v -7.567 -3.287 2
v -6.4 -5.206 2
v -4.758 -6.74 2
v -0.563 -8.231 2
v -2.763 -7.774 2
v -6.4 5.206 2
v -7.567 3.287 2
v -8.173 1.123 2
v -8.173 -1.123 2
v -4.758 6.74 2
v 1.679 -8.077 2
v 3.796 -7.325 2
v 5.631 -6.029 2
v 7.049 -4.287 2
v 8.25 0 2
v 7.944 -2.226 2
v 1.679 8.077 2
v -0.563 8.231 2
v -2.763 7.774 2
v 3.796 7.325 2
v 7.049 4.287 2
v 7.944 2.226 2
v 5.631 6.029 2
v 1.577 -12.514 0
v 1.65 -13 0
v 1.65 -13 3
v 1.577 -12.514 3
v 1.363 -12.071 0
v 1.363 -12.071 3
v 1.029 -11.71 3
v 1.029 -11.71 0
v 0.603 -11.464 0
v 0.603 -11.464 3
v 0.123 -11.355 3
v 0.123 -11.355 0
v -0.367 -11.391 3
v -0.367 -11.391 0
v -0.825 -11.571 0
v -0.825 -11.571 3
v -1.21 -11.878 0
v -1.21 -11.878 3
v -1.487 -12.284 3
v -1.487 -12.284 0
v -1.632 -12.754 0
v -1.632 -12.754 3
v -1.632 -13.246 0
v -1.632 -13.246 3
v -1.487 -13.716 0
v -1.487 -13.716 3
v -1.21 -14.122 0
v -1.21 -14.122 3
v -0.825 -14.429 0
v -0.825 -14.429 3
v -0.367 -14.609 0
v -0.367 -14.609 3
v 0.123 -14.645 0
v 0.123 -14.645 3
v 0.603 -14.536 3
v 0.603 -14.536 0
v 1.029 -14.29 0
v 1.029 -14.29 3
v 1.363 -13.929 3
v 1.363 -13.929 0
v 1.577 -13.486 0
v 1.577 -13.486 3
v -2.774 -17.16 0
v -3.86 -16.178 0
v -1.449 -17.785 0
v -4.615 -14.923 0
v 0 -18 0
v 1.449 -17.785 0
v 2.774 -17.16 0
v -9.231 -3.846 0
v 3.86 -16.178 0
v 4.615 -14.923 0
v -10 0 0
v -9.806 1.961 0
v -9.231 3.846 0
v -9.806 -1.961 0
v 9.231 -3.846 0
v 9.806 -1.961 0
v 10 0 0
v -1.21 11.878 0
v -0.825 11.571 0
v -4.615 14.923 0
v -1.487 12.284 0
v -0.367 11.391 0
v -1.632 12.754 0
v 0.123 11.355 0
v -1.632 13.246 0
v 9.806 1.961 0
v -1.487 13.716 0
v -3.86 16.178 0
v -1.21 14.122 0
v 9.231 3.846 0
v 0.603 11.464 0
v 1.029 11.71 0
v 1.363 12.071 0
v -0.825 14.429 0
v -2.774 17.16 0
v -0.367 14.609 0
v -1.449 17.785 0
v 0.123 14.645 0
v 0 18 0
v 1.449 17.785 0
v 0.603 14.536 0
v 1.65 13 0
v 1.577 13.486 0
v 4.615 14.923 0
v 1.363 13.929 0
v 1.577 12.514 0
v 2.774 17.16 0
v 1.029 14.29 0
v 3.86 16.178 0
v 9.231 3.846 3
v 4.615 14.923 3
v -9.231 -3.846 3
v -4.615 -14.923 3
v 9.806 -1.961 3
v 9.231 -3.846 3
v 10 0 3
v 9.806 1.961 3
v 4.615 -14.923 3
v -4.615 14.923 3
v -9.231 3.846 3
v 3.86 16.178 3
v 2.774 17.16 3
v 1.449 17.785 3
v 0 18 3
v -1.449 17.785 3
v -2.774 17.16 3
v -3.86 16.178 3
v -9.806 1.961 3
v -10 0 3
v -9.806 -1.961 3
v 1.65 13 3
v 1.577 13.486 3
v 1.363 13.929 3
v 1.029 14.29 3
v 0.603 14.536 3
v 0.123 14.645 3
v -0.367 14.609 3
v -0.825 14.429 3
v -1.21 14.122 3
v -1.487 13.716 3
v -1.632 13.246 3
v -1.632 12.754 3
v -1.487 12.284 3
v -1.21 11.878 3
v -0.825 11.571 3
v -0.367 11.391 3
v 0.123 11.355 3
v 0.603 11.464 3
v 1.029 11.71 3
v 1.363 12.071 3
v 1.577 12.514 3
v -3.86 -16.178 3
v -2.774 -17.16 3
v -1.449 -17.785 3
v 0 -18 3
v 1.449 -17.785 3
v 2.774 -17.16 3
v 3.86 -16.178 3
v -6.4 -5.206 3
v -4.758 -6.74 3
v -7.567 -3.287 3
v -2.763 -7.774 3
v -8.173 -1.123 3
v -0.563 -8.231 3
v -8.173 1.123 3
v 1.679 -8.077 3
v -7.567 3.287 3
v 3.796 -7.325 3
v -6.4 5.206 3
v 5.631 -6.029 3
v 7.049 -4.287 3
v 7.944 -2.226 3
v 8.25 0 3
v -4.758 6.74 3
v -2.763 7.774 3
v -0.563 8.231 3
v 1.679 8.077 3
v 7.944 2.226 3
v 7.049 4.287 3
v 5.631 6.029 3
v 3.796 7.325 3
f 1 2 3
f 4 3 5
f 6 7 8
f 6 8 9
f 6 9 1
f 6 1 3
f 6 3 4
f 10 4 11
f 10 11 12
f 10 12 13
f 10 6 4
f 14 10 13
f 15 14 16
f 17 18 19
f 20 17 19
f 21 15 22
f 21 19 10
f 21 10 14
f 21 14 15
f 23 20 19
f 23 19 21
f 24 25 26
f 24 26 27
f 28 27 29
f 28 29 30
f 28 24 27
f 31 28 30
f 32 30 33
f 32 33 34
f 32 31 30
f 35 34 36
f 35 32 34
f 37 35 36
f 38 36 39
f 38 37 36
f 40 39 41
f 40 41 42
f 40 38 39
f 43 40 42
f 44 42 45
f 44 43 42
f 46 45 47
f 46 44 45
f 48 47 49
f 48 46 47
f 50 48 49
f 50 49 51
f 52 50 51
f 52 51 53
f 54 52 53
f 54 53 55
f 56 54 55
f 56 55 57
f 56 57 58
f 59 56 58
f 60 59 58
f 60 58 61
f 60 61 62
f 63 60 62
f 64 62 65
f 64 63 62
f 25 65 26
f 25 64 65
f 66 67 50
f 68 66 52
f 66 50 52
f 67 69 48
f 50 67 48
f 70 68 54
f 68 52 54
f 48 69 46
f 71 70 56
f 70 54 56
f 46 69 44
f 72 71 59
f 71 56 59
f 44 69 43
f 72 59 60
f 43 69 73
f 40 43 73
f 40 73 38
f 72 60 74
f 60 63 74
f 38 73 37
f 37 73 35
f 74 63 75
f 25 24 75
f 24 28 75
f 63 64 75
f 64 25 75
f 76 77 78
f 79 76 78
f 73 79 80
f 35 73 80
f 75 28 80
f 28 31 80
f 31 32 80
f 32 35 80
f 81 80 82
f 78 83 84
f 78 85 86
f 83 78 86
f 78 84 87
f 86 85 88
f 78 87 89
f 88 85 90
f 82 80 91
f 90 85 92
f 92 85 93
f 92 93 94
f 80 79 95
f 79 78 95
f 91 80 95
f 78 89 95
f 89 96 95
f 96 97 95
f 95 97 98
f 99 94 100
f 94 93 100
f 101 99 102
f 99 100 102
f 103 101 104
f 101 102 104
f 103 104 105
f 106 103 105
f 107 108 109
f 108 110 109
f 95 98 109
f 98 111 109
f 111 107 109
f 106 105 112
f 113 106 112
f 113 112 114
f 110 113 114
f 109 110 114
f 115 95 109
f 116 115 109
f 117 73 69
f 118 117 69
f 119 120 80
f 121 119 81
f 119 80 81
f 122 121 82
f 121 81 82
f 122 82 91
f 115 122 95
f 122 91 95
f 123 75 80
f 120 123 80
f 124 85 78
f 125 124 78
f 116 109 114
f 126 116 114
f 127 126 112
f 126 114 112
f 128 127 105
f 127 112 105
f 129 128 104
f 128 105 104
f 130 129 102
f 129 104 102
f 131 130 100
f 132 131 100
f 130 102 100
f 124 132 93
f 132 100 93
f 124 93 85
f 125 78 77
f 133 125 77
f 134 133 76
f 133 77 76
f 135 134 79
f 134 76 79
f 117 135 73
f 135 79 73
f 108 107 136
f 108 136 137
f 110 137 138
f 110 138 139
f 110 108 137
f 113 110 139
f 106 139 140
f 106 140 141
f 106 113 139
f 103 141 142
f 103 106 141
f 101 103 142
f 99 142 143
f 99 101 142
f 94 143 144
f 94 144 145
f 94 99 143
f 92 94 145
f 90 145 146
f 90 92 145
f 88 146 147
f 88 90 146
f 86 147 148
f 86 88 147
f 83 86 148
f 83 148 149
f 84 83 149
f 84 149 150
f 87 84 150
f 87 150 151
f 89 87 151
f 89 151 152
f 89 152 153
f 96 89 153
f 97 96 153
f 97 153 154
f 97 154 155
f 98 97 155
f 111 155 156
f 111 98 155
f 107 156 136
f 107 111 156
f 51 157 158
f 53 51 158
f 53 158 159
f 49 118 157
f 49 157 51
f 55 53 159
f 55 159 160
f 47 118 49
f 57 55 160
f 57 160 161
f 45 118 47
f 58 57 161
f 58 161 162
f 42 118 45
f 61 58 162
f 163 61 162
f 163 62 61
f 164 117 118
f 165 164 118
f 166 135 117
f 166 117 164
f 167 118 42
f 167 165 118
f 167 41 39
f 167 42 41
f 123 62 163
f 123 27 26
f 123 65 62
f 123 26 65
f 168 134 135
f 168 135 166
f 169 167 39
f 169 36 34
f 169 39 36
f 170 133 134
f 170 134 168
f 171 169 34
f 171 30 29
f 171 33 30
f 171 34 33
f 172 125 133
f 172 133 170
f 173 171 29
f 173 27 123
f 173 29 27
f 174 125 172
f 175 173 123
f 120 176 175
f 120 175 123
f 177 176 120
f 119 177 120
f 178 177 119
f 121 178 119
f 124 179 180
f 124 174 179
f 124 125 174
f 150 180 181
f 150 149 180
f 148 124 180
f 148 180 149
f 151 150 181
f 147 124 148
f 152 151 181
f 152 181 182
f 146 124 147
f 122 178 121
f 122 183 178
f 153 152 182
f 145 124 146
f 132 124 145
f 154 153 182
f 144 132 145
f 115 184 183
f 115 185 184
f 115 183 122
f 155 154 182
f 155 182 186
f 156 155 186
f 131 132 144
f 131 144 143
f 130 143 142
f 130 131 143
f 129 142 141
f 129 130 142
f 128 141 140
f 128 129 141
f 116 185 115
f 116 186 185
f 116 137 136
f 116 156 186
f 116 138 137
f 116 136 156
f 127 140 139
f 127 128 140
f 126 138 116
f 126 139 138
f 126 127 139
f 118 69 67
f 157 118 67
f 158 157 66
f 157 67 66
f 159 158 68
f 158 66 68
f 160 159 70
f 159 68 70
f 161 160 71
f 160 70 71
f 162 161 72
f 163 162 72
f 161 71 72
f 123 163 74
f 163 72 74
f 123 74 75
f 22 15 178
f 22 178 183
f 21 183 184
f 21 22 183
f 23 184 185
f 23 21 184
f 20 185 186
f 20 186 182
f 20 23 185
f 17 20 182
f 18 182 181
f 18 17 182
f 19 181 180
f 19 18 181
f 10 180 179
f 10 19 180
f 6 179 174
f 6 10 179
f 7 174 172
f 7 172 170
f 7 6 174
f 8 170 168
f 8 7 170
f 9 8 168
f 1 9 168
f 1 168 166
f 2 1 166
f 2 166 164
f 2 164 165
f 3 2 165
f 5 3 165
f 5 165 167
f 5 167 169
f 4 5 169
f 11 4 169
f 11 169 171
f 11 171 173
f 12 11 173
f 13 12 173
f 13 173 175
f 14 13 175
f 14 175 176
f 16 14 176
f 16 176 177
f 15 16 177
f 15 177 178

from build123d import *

# Parameters (mm, degrees)
SKETCH_1_R      = 1.65
SKETCH_1_R_2    = 8.25
EXTRUDE_1_DEPTH = 3
SKETCH_1_3_R    = 8.25
EXTRUDE_2_DEPTH = 2


with BuildPart() as part:
    # 草图1 → 凸台-拉伸1 (new body)
    with BuildSketch(Plane.XY):
        with BuildLine():
            Line((-4.615384615, 14.923076923), (-9.230769231, 3.846153846))
            ThreePointArc((-9.230769231, 3.846153846), (-10, 0), (-9.230769231, -3.846153846))
            Line((-9.230769231, -3.846153846), (-4.615384615, -14.923076923))
            ThreePointArc((-4.615384615, -14.923076923), (0, -18), (4.615384615, -14.923076923))
            Line((4.615384615, -14.923076923), (9.230769231, -3.846153846))
            ThreePointArc((9.230769231, -3.846153846), (10, 0), (9.230769231, 3.846153846))
            Line((9.230769231, 3.846153846), (4.615384615, 14.923076923))
            ThreePointArc((4.615384615, 14.923076923), (0, 18), (-4.615384615, 14.923076923))
        make_face()
        with Locations((0, 13)):
            Circle(SKETCH_1_R, mode=Mode.SUBTRACT)
        Circle(SKETCH_1_R_2, mode=Mode.SUBTRACT)
        with Locations((0, -13)):
            Circle(SKETCH_1_R, mode=Mode.SUBTRACT)
    extrude(amount=EXTRUDE_1_DEPTH)

    # 草图1<3> → 凸台-拉伸2 (add)
    with BuildSketch(Plane.XY):
        Circle(SKETCH_1_3_R)
    extrude(amount=EXTRUDE_2_DEPTH)


solid = part.part
